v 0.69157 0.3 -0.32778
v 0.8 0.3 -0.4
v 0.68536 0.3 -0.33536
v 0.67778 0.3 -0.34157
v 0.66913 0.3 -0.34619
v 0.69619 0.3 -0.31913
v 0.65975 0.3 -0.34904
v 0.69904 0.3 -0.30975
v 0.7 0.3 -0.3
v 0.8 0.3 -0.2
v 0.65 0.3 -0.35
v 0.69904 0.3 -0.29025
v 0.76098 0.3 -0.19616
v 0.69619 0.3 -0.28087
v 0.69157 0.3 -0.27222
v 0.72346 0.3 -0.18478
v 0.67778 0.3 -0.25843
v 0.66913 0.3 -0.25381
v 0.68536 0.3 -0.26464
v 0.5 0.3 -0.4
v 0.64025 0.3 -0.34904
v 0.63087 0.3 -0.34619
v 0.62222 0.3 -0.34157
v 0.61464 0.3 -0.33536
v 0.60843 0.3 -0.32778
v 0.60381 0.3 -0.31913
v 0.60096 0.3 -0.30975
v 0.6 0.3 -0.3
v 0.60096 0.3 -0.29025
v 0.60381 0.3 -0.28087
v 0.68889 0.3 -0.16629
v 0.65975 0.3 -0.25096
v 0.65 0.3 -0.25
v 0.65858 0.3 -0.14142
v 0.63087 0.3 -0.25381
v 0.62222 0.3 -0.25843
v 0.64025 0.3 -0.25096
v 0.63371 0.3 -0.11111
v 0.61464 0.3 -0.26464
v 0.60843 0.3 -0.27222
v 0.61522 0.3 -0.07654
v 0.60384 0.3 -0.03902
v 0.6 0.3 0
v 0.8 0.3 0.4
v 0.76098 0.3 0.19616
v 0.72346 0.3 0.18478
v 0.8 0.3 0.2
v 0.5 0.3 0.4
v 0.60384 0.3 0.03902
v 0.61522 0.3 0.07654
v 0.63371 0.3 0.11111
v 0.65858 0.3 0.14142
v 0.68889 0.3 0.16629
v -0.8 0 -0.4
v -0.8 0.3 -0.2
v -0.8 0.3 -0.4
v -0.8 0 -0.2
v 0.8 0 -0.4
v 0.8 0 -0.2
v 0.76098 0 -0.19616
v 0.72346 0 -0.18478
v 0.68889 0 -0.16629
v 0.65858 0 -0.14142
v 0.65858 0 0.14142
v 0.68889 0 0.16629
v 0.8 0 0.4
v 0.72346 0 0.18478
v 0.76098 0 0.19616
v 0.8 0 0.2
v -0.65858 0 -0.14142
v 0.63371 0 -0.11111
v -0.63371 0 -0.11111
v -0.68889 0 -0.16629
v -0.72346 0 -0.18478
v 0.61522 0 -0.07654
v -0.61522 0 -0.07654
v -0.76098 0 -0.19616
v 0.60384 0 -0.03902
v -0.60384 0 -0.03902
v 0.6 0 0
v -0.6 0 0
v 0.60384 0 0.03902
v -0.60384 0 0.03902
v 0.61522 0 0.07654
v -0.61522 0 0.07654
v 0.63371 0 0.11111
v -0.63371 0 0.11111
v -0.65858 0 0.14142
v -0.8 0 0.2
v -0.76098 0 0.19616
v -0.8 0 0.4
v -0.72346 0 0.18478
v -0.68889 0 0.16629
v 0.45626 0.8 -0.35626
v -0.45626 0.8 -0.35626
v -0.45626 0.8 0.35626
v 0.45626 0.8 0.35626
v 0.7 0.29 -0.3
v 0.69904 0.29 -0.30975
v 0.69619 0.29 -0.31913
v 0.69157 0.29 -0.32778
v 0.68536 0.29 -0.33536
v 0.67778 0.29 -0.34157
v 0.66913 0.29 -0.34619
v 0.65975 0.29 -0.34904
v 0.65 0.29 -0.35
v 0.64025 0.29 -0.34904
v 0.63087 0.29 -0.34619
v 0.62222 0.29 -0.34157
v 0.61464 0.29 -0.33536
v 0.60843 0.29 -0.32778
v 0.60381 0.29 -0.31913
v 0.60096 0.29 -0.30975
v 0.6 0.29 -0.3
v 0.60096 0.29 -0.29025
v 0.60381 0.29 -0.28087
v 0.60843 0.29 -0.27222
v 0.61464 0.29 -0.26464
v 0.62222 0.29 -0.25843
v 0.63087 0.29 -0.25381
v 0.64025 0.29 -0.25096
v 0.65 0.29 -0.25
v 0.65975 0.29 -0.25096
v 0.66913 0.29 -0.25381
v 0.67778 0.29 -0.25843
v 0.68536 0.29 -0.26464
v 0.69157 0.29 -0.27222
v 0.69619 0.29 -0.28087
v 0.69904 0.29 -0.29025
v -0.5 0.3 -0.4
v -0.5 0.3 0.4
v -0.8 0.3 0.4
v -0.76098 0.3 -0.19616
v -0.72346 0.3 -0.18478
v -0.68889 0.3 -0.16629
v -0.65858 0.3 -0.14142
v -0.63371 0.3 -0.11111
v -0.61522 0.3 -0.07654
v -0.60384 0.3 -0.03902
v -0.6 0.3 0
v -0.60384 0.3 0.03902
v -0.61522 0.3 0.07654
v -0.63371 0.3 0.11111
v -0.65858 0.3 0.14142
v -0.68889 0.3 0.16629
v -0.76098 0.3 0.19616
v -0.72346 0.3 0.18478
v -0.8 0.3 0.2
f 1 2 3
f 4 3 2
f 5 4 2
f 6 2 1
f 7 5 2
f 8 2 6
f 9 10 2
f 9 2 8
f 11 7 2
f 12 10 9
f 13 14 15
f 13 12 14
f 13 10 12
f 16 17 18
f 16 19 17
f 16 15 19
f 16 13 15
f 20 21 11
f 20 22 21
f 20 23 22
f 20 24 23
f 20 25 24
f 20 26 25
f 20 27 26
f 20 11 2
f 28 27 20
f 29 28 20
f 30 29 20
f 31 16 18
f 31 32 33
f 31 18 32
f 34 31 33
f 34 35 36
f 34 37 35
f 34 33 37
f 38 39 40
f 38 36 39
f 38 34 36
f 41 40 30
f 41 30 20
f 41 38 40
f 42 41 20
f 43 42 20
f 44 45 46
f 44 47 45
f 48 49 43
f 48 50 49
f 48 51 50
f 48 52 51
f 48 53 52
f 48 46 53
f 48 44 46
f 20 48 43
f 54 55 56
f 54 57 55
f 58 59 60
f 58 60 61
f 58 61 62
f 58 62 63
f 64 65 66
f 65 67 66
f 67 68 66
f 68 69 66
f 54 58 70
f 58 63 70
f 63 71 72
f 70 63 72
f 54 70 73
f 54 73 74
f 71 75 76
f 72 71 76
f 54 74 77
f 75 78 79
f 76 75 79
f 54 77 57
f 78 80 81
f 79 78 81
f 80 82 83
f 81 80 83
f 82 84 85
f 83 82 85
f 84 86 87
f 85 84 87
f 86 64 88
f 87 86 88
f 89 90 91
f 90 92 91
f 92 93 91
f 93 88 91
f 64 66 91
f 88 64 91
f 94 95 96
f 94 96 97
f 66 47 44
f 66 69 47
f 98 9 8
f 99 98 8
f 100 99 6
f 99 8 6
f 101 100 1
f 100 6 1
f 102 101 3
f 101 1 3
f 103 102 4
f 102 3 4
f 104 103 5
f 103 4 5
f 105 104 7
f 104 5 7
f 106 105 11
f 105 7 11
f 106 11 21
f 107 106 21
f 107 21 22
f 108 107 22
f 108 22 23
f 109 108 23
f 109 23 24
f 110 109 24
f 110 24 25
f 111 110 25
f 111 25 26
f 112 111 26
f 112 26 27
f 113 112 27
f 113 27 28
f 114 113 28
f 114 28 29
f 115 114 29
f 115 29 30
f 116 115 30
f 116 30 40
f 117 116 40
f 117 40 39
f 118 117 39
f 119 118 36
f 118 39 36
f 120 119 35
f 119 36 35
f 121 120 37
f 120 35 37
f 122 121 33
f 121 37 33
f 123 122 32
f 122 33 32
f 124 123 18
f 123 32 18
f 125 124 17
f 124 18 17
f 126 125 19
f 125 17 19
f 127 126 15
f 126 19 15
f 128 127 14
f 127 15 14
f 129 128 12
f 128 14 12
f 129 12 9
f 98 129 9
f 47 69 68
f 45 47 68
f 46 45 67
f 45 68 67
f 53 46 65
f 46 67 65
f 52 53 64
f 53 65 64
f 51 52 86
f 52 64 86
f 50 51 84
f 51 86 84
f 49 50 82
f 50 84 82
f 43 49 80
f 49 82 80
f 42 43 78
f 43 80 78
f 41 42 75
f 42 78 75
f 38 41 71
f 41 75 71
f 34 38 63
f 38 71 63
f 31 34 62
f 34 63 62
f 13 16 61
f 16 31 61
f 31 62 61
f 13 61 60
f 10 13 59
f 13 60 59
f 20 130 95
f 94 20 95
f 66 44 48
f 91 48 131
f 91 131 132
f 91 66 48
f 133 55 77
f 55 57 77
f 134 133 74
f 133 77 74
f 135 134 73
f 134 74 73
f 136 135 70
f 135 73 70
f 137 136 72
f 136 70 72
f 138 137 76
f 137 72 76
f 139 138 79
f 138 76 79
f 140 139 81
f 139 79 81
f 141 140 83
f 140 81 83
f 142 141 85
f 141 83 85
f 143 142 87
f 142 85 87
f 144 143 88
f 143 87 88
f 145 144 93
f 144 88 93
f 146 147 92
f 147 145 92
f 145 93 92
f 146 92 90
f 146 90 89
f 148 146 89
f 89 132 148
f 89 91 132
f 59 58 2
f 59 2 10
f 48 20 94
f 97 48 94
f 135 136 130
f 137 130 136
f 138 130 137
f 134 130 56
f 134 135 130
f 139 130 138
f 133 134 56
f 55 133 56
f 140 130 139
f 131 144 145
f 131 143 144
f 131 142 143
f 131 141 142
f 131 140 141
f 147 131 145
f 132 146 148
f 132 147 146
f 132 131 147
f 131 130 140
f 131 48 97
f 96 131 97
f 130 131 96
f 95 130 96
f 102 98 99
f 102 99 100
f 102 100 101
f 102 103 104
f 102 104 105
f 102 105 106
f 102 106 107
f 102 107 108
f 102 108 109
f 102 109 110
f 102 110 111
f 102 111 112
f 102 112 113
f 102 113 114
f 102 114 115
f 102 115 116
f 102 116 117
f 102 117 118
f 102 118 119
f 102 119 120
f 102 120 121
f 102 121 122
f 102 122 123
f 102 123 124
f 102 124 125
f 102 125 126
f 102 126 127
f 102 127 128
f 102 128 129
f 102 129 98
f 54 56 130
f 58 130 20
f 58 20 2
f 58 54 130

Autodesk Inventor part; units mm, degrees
ref_plane "YZ Plane" through (0, 0, 0) normal (1, 0, 0) x (0, 1, 0)
ref_plane "XZ Plane" through (0, 0, 0) normal (0, 1, 0) x (-1, 0, 0)
ref_plane "XY Plane" through (0, 0, 0) normal (0, 0, 1) x (1, 0, 0)
sketch "Sketch10" plane through (0, 0, 0) normal (0, 1, 0) x (-1, 0, 0)
  line L0 (0.8, -0.4) -> (-0.8, -0.4)
  line L1 (-0.8, 0.4) -> (0.8, 0.4)
  arc A0 (0.8, 0.2) -> (0.8, -0.2) centre (0.8, 0) ccw
  arc A1 (-0.8, -0.2) -> (-0.8, 0.2) centre (-0.8, 0) ccw
  line L2 (0.8, 0.4) -> (0.8, 0.2)
  line L3 (0.8, -0.2) -> (0.8, -0.4)
  line L4 (-0.8, -0.4) -> (-0.8, -0.2)
  line L5 (-0.8, 0.2) -> (-0.8, 0.4)
  point P0 (0, 0)
  point P1 (0, -0.4)
  dimension "d7" = 1.6
  dimension "d8" = 0.8
  dimension "d9" = 0.2
extrude "Extrusion4" add sketch "Sketch10" along normal blind 0.3
sketch "Sketch11" plane through (0, 0.3, 0) normal (0, 1, 0) x (1, 0, 0)
  line L0 (0.8, 0.4) -> (-0.8, 0.4) construction
  line L1 (-0.8, 0.4) -> (-0.8, 0.2) projected
  arc A0 (-0.8, -0.2) -> (-0.8, 0.2) centre (-0.8, 0) ccw projected
  line L2 (-0.8, -0.2) -> (-0.8, -0.4) projected
  line L3 (-0.8, -0.4) -> (0.8, -0.4) construction
  line L4 (0.8, -0.4) -> (0.8, -0.2) construction
  arc A1 (0.8, 0.2) -> (0.8, -0.2) centre (0.8, 0) ccw construction
  line L5 (0.8, 0.2) -> (0.8, 0.4) construction
  line L6 (-0.5, 0.4) -> (0.5, 0.4)
  line L7 (0.5, 0.4) -> (0.5, -0.4)
  line L8 (0.5, -0.4) -> (-0.5, -0.4)
  line L9 (-0.5, -0.4) -> (-0.5, 0.4)
  circle A2 centre (0, 0) radius 0.15
  circle A3 centre (0.65, 0.3) radius 0.05
  point P0 (0, 0.4)
  point P1 (0, -0.4)
  point P2 (0.5, 0)
  dimension "d12" = 1
  dimension "d13" = 0.8
  dimension "d16" = 0.3
  dimension "d20" = 0.15
  dimension "d21" = 0.1
  dimension "d22" = 0.1
extrude "Extrusion6" add sketch "Sketch11" along normal blind 0.1 contours A2
extrude "Extrusion5" add sketch "Sketch11" along normal blind 0.5 draft -5 contours L6 L7 L8 L9 | A2
extrude "Extrusion7" cut sketch "Sketch11" against normal blind 0.01 contours A3
properties part number "HSMG-C190 LED"
